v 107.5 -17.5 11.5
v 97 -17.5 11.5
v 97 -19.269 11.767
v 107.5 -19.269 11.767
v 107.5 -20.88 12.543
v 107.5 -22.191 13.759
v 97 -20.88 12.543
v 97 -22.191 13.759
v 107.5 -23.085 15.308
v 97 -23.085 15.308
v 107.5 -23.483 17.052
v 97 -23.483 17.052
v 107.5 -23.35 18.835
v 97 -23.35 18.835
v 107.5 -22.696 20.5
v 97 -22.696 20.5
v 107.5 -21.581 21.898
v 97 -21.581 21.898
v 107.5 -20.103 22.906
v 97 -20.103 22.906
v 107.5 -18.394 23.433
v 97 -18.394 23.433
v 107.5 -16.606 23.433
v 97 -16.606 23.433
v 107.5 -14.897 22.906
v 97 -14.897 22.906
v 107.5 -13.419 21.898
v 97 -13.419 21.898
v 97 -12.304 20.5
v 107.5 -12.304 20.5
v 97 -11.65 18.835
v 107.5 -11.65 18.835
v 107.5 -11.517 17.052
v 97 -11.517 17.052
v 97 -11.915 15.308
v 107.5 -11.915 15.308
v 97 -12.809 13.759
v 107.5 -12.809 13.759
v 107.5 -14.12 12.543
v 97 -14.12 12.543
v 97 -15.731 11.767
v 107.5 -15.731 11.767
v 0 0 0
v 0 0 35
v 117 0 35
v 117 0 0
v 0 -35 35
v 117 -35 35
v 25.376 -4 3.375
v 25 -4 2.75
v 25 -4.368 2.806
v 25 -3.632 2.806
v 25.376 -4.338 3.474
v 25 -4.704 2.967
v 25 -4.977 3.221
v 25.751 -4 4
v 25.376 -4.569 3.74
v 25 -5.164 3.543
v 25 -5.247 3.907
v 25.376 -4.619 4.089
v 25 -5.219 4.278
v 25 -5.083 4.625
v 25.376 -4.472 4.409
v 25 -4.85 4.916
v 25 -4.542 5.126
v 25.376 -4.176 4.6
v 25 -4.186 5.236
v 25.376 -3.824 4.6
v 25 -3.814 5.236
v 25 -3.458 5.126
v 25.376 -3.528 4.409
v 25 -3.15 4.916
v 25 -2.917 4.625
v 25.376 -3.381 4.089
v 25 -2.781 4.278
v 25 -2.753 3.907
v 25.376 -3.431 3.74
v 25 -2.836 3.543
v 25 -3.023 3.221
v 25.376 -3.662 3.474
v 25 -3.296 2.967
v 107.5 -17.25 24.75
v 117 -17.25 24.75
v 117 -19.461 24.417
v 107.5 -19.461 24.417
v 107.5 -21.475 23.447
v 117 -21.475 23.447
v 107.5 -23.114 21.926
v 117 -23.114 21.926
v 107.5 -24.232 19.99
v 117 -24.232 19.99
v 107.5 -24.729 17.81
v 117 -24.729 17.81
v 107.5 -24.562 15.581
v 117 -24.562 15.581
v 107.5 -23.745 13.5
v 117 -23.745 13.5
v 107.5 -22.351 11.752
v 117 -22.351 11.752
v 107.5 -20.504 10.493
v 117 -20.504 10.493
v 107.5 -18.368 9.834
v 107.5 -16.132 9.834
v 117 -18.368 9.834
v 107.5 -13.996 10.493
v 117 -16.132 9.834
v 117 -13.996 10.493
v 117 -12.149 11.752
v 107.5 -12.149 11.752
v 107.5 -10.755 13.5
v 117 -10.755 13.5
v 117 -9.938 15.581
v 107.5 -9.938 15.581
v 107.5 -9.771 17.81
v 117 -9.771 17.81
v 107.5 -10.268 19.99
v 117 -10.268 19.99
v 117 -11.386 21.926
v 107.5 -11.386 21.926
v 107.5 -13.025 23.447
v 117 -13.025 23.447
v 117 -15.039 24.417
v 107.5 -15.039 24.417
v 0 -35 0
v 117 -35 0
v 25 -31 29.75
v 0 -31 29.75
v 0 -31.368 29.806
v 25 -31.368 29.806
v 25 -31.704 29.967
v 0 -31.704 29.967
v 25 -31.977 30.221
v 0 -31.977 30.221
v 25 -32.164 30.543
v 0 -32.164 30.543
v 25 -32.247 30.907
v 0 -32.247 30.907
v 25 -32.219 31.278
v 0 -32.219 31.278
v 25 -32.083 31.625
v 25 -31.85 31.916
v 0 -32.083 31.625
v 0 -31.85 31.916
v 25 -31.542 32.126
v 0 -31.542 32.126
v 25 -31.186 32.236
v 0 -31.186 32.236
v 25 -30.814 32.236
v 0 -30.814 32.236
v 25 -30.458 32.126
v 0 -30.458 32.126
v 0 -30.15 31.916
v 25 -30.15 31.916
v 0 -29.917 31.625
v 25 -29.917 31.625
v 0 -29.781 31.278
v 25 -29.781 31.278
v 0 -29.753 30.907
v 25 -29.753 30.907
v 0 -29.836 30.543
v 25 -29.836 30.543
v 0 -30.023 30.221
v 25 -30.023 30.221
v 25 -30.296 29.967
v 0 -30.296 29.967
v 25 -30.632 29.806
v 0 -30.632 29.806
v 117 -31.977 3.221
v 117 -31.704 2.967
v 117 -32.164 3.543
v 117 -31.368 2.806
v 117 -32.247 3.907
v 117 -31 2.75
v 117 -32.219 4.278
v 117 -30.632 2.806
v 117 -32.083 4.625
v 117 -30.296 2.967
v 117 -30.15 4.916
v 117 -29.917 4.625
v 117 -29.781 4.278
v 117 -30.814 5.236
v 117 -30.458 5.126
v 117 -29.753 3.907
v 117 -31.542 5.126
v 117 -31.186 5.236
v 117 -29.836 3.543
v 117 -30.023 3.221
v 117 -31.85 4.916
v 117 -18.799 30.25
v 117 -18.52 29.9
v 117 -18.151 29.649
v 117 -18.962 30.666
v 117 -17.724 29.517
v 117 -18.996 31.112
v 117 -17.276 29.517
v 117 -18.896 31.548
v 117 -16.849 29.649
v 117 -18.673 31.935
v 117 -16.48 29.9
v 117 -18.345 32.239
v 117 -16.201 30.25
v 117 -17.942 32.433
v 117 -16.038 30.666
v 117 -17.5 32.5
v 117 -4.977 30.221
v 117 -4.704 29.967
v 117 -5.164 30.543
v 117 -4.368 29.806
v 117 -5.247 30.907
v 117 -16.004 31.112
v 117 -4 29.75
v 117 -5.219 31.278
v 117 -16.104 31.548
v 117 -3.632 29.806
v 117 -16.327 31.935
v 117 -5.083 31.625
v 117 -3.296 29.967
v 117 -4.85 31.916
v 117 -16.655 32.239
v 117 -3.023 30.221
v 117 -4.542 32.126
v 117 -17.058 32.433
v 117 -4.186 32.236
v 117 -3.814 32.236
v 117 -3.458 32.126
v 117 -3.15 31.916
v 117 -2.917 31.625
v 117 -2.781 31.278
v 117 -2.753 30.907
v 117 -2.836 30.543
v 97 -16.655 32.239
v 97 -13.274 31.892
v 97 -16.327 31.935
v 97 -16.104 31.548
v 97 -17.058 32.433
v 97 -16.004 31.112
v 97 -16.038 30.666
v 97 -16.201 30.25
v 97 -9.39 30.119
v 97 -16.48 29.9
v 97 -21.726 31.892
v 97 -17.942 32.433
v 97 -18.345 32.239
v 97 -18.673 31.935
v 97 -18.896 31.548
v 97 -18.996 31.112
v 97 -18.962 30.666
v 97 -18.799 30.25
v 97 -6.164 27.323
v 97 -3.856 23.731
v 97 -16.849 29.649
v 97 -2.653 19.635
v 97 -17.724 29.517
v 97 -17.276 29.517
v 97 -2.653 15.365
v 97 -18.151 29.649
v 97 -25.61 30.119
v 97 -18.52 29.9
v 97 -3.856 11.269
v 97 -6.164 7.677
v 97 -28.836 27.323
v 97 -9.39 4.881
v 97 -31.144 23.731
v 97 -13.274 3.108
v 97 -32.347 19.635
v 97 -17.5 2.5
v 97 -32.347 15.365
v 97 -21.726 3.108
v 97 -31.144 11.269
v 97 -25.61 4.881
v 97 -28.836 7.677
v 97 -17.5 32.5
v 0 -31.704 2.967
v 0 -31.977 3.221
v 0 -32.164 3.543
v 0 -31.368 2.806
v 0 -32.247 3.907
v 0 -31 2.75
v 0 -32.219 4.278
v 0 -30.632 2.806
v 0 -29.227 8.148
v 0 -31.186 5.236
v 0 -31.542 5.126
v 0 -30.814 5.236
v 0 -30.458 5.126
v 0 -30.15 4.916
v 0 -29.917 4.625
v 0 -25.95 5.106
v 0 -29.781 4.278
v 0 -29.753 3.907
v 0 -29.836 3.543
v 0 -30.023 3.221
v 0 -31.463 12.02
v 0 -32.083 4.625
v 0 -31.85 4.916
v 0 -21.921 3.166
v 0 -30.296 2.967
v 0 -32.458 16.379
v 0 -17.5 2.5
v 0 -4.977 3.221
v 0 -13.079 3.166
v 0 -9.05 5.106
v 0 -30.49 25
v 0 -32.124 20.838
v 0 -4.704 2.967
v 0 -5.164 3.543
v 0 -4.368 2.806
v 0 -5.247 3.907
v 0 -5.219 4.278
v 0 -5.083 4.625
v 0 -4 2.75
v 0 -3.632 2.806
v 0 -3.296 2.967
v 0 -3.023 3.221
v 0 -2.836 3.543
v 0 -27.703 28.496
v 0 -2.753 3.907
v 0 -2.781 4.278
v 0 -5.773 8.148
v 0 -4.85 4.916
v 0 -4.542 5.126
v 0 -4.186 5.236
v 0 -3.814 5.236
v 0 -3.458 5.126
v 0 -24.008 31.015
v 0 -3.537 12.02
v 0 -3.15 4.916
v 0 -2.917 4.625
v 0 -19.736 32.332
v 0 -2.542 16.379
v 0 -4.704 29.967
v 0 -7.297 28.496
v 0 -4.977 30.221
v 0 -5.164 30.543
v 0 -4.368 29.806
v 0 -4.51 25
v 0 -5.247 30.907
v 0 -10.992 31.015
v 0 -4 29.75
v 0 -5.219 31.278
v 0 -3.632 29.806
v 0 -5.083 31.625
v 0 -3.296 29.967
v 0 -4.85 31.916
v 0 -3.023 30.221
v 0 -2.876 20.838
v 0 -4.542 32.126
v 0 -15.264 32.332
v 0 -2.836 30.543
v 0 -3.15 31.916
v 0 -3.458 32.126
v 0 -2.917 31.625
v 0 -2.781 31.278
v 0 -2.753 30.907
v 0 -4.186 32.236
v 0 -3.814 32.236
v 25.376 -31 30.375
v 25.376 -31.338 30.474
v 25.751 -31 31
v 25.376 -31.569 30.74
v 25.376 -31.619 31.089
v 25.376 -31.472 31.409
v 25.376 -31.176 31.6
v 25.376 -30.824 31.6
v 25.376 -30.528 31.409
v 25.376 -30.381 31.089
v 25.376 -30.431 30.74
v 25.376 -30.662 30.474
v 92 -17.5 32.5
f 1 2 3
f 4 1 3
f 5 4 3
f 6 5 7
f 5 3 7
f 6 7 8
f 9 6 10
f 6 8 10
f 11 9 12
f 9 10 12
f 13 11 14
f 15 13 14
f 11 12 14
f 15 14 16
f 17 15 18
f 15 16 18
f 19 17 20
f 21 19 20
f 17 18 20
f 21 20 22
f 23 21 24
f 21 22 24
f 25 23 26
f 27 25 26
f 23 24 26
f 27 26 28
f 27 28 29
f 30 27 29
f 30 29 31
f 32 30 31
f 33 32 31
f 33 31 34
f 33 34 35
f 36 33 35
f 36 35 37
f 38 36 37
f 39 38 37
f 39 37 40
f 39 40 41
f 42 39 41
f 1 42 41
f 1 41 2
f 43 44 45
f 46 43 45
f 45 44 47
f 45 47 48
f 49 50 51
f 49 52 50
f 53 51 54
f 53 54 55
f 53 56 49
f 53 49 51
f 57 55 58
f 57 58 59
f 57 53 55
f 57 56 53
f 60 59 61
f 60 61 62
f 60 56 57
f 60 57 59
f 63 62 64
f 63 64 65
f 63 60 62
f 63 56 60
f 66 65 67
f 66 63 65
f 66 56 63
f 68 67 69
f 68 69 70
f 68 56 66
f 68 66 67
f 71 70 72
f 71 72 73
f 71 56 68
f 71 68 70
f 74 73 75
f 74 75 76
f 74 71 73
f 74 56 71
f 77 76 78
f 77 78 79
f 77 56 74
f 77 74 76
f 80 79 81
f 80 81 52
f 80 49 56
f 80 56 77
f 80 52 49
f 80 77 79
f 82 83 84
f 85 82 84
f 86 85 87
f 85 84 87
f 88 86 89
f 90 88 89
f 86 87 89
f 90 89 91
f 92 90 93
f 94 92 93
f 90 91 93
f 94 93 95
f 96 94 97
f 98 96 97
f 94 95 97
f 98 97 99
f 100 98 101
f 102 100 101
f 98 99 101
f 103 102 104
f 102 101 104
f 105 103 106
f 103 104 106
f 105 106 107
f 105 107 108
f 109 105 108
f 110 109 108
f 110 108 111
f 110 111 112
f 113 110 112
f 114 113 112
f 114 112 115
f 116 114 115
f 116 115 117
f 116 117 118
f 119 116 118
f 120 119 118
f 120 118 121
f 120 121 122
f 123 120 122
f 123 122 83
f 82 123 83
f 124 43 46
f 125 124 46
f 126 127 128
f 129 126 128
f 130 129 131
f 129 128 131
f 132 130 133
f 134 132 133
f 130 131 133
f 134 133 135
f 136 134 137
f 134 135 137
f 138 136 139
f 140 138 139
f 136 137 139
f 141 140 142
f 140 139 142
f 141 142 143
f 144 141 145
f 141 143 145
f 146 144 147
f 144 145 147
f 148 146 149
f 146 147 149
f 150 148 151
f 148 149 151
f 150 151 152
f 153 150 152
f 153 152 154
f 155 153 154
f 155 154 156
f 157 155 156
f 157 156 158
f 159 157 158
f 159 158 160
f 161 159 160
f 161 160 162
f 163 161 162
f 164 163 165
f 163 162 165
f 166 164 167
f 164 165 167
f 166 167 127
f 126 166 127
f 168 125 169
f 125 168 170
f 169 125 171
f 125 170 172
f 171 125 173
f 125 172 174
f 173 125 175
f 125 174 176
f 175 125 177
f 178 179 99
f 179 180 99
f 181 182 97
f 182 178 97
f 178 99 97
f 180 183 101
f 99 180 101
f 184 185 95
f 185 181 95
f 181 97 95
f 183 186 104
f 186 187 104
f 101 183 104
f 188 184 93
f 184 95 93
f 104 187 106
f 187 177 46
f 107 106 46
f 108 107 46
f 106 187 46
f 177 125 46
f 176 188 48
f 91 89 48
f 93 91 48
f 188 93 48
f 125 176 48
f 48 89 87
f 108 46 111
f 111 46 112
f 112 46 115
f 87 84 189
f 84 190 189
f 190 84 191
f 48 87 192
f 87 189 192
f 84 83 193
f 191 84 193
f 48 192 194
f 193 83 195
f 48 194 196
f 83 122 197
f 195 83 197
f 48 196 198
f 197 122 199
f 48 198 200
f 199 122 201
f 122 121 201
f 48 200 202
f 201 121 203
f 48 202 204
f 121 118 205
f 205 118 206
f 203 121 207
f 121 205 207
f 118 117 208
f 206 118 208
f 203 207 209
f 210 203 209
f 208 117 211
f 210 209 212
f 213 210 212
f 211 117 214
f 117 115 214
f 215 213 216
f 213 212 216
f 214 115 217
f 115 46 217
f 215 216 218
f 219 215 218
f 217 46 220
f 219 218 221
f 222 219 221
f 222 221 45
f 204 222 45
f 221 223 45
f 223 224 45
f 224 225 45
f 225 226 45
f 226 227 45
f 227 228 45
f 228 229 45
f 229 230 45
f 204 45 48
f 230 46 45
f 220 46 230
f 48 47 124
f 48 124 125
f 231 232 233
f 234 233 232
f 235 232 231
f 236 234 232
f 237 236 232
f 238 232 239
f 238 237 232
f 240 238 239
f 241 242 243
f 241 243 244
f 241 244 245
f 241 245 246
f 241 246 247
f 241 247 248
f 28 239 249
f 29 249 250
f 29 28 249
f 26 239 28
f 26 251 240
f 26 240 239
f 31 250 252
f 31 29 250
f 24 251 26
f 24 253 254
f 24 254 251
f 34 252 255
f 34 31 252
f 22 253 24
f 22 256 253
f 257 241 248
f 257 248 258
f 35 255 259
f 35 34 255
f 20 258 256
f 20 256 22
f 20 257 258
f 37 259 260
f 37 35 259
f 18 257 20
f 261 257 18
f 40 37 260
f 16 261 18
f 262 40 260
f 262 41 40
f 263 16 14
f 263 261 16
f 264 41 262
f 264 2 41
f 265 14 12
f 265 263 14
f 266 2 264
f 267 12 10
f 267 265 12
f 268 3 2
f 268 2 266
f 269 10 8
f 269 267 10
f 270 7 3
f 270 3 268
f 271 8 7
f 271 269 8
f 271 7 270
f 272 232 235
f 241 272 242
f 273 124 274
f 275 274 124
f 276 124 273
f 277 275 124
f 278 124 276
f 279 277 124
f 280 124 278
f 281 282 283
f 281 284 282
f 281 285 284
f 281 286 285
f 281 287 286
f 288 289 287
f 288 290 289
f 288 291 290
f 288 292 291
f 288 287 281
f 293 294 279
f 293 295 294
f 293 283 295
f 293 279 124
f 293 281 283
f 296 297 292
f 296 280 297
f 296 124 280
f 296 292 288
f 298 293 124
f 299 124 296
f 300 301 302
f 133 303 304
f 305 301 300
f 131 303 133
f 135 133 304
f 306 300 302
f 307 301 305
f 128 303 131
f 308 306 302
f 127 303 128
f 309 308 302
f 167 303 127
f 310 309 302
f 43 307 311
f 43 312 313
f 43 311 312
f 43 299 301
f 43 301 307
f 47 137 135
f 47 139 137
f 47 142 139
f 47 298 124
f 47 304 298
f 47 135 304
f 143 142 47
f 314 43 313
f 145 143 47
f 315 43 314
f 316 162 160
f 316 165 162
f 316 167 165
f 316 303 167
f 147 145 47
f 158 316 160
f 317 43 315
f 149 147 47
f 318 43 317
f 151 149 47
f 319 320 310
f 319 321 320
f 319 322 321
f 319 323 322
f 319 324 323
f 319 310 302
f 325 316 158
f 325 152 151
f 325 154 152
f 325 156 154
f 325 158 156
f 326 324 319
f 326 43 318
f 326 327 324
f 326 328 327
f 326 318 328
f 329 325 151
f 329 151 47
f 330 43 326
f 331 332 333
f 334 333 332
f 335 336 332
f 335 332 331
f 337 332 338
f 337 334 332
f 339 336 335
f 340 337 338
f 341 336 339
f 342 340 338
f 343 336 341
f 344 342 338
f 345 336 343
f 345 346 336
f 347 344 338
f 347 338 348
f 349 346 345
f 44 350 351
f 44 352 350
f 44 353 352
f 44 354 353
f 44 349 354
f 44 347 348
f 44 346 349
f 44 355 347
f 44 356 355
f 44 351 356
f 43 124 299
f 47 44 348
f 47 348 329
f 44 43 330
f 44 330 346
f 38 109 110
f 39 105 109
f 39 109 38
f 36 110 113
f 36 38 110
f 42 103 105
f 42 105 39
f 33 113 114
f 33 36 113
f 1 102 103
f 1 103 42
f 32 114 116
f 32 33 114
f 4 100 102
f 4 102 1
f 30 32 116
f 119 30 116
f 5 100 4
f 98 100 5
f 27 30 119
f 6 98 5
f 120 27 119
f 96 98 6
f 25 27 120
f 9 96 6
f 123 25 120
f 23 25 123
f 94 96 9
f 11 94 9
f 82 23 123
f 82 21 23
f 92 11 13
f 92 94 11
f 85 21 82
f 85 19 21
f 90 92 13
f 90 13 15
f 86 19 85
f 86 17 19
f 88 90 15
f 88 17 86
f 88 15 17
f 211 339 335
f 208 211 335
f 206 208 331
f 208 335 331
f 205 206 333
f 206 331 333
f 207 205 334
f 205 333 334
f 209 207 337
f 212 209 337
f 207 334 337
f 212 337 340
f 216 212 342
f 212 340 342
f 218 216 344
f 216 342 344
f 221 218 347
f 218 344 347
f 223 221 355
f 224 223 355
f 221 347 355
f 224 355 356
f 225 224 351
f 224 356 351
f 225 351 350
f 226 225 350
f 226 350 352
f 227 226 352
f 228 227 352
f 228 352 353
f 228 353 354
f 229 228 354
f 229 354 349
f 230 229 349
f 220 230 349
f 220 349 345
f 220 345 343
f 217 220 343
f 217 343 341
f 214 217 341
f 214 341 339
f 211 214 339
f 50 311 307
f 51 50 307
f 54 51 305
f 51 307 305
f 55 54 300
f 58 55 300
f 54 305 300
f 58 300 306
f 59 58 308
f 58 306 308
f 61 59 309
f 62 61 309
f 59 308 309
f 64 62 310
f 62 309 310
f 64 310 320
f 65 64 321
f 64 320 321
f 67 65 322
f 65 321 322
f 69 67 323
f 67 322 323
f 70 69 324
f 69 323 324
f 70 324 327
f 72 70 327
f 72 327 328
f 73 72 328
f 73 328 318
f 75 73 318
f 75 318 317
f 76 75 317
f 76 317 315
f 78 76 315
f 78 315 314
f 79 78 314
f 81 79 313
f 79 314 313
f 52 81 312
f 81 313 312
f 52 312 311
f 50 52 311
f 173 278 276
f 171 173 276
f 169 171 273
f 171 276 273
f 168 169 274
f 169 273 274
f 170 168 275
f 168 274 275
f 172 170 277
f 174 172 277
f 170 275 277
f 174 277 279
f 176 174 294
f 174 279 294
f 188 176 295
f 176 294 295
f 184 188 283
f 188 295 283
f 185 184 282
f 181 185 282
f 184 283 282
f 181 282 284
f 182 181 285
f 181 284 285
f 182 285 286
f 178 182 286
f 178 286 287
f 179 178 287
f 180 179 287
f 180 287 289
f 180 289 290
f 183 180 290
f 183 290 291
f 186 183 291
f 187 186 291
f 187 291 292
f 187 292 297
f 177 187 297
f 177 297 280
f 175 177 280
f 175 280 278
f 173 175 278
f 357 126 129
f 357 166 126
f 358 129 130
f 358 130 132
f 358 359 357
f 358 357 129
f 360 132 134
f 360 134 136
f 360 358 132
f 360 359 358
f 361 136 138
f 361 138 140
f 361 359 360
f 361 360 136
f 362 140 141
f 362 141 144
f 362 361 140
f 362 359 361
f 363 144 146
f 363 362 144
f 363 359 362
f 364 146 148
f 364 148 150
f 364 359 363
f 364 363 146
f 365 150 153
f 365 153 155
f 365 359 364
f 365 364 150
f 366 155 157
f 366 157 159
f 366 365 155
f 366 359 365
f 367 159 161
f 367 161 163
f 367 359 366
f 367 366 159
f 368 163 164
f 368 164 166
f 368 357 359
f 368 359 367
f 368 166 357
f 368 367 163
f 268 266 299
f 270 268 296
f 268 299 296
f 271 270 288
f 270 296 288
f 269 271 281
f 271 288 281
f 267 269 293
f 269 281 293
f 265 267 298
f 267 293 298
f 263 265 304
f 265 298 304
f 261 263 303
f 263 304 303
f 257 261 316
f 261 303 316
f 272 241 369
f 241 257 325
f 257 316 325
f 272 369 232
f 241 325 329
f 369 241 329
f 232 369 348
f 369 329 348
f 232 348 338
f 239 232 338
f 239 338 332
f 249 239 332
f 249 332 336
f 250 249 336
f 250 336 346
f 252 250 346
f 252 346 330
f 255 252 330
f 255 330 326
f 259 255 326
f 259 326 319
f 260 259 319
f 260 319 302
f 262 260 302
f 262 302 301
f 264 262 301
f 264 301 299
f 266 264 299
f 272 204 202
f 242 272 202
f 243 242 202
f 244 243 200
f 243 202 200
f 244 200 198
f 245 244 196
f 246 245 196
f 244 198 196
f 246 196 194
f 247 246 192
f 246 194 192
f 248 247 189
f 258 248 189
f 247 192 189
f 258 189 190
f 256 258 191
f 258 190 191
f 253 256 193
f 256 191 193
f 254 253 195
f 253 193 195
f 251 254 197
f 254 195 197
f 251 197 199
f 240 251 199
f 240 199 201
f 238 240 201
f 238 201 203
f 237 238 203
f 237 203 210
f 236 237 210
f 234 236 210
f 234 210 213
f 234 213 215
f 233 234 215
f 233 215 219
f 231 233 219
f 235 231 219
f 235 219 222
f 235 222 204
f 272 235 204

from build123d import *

# Parameters (mm, degrees)
SKETCH_W        = 117
SKETCH_H        = 35
PAD_DEPTH       = 35
SKETCH001_R     = 15
POCKET_DEPTH    = 97
SKETCH002_R     = 7.5
POCKET001_DEPTH = 12.5
SKETCH003_R     = 6
POCKET002_DEPTH = 12.5
SKETCH004_R     = 1.25
HOLE_DEPTH      = 117.001
SKETCH005_R     = 1.25
HOLE001_DEPTH   = 25
HOLE001_TIPS_R  = 1.25
SKETCH006_R     = 1.5
HOLE002_DEPTH   = 25
HOLE002_TIPS_R  = 1.5


with BuildPart() as part:
    # Sketch → Pad (new body)
    with BuildSketch(Plane.XZ):
        with Locations((58.5, 17.5)):
            Rectangle(SKETCH_W, SKETCH_H)
    extrude(amount=PAD_DEPTH)

    # Sketch001 → Pocket (cut)
    with BuildSketch(Plane(origin=(0, 0, 0), x_dir=(0, 0, -1), z_dir=(-1, 0, 0))):
        with Locations((-17.5, 17.5)):
            Circle(SKETCH001_R)
    extrude(amount=-POCKET_DEPTH, mode=Mode.SUBTRACT)

    # Sketch002 → Pocket001 (cut)
    with BuildSketch(Plane(origin=(120, 0, 0), x_dir=(0, 0, 1), z_dir=(1, 0, 0))):
        with Locations((17.25, 17.25)):
            Circle(SKETCH002_R)
    extrude(amount=-POCKET001_DEPTH, mode=Mode.SUBTRACT)

    # Sketch003 → Pocket002 (cut)
    with BuildSketch(Plane(origin=(97, 0, 0), x_dir=(0, 0, -1), z_dir=(-1, 0, 0))):
        with Locations((-17.5, 17.5)):
            Circle(SKETCH003_R)
    extrude(amount=-POCKET002_DEPTH, mode=Mode.SUBTRACT)

    # Sketch004 → Hole (cut, through all)
    with BuildSketch(Plane(origin=(0, 0, 0), x_dir=(0, 0, -1), z_dir=(-1, 0, 0))):
        with Locations((-31, 4)):
            Circle(SKETCH004_R)
        with Locations((-4, 31)):
            Circle(SKETCH004_R)
    extrude(amount=-HOLE_DEPTH, mode=Mode.SUBTRACT)

    # Sketch005 (on Face2 of Hole) → Hole001 (cut)
    with BuildSketch(Plane(origin=(0, 0, 0), x_dir=(0, 0, -1), z_dir=(-1, 0, 0))):
        with Locations((-4, 4)):
            Circle(SKETCH005_R)
        with Locations((-31, 31)):
            Circle(SKETCH005_R)
    extrude(amount=-HOLE001_DEPTH, mode=Mode.SUBTRACT)

    # Hole001 tips → Hole001 tip 1 section 0
    with BuildSketch(Plane(origin=(25, 0, 0), x_dir=(0, 0, -1), z_dir=(-1, 0, 0)), mode=Mode.PRIVATE) as hole001_tip_1_s0:
        with Locations((-4, 4)):
            Circle(HOLE001_TIPS_R)
    loft([hole001_tip_1_s0.sketch, Vertex(25.751076, -4, 4)], mode=Mode.SUBTRACT)

    # Hole001 tips → Hole001 tip 2 section 0
    with BuildSketch(Plane(origin=(25, 0, 0), x_dir=(0, 0, -1), z_dir=(-1, 0, 0)), mode=Mode.PRIVATE) as hole001_tip_2_s0:
        with Locations((-31, 31)):
            Circle(HOLE001_TIPS_R)
    loft([hole001_tip_2_s0.sketch, Vertex(25.751076, -31, 31)], mode=Mode.SUBTRACT)

    # Sketch006 → Hole002 (cut)
    with BuildSketch(Plane(origin=(117, 0, 0), x_dir=(0, 0, 1), z_dir=(1, 0, 0))):
        with Locations((31, 17.5)):
            Circle(SKETCH006_R)
    extrude(amount=-HOLE002_DEPTH, mode=Mode.SUBTRACT)

    # Hole002 tips → Hole002 tip 1 section 0
    with BuildSketch(Plane(origin=(92, 0, 0), x_dir=(0, 0, 1), z_dir=(1, 0, 0)), mode=Mode.PRIVATE) as hole002_tip_1_s0:
        with Locations((31, 17.5)):
            Circle(HOLE002_TIPS_R)
    loft([hole002_tip_1_s0.sketch, Vertex(91.098709, -17.5, 31)], mode=Mode.SUBTRACT)


solid = part.part
